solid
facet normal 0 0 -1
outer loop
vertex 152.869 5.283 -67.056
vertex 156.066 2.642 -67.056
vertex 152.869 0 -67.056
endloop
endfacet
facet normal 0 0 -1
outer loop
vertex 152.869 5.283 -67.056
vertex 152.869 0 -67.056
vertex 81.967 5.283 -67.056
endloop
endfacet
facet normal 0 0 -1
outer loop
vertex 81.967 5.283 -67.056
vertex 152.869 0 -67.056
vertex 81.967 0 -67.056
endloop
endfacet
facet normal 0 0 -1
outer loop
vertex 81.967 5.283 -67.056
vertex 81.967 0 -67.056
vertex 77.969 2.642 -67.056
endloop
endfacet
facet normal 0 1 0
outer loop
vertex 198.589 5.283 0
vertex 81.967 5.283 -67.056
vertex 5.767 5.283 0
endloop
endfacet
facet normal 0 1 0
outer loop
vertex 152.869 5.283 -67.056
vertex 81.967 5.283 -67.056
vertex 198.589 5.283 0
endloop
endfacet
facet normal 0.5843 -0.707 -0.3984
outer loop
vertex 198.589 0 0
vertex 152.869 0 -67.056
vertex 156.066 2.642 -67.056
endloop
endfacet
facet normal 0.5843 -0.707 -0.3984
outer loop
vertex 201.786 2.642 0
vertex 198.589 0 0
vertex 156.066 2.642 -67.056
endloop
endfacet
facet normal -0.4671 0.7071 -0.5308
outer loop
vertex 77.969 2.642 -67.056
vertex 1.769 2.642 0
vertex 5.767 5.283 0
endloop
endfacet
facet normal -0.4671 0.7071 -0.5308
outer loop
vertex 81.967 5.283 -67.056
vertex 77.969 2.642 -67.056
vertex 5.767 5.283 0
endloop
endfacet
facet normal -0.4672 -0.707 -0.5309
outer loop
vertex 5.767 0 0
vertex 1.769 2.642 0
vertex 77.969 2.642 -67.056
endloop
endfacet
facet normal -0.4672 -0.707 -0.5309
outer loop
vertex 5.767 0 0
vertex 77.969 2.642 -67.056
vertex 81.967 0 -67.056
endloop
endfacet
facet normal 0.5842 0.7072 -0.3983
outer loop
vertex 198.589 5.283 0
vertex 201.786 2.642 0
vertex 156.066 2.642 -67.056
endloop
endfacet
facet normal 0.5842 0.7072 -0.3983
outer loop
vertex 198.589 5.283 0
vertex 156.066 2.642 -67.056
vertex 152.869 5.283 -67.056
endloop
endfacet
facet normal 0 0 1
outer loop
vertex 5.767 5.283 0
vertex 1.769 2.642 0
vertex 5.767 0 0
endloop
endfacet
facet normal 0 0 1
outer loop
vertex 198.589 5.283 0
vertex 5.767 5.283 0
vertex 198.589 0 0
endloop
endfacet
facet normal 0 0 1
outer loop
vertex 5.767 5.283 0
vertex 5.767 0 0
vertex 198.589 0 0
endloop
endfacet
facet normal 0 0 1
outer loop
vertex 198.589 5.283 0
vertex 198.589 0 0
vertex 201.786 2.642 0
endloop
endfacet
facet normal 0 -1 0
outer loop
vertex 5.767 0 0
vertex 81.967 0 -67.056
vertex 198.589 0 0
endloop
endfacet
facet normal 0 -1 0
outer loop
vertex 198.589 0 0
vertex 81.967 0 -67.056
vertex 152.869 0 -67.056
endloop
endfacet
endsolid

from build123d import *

# Parameters (mm, degrees)
BOSS_EXTRUDE1_DEPTH = 5.2832
CHAMFER1_SIZE       = 3.81
CHAMFER2_SIZE       = 3.81


with BuildPart() as part:
    # Sketch1 → Boss-Extrude1 (new body)
    with BuildSketch(Plane(origin=(0, 0, 0), x_dir=(1, 0, 0), z_dir=(0, 1, 0))):
        Polygon((0, 0), (203.2, 0), (157.48, 67.056), (76.2, 67.056), align=None)
    extrude(amount=BOSS_EXTRUDE1_DEPTH)

    # Chamfer1
    # the kernel refuses this chamfer: 3.81 mm, written as the material it takes off along each edge
    with BuildSketch(Plane(origin=(83.555575257, 5.2832, -73.528906226), x_dir=(-0.018164543083463394, -0.9996219169112968, -0.020641526231208396), z_dir=(-0.7507135169227552, 0, 0.6606278948920248))) as chamfer1_piece_1:
        Polygon((CHAMFER1_SIZE * 0.999621916911, CHAMFER1_SIZE * 0.0274958766106), (-CHAMFER1_SIZE * 0.0274958766106, CHAMFER1_SIZE * 0.999621916911), (0, 0), align=None)
    extrude(amount=121.099658478, mode=Mode.SUBTRACT)
    with BuildSketch(Plane(origin=(83.555575257, 0, -73.528906226), x_dir=(-0.018164543083463394, 0.9996219169112968, -0.020641526231208396), z_dir=(-0.7507135169227552, 0, 0.6606278948920248))) as chamfer1_piece_2:
        Polygon((CHAMFER1_SIZE * 0.999621916911, -CHAMFER1_SIZE * 0.0274958766106), (-CHAMFER1_SIZE * 0.0274958766106, -CHAMFER1_SIZE * 0.999621916911), (0, 0), align=None)
    extrude(amount=121.099658478, mode=Mode.SUBTRACT)

    # Chamfer2
    # the kernel refuses this chamfer: 3.81 mm, written as the material it takes off along each edge
    with BuildSketch(Plane(origin=(208.719637405, 0, 8.095468194), x_dir=(-0.8259149602218081, -0.027495876610586452, 0.5631238365148687), z_dir=(-0.5633368246415095, 0, -0.8262273428075478)), Plane(origin=(208.719637405, 5.2832, 8.095468194), x_dir=(0.022717845070130322, -0.9996219169112966, -0.015489439820543389), z_dir=(-0.5633368246415095, 0, -0.8262273428075478))) as chamfer2_piece_1:
        Polygon((CHAMFER2_SIZE * 0.999621916911, CHAMFER2_SIZE * 0.0274958766106), (-CHAMFER2_SIZE * 0.0274958766106, CHAMFER2_SIZE * 0.999621916911), (0, 0), align=None)
    extrude(amount=100.75548469, mode=Mode.SUBTRACT)


solid = part.part
